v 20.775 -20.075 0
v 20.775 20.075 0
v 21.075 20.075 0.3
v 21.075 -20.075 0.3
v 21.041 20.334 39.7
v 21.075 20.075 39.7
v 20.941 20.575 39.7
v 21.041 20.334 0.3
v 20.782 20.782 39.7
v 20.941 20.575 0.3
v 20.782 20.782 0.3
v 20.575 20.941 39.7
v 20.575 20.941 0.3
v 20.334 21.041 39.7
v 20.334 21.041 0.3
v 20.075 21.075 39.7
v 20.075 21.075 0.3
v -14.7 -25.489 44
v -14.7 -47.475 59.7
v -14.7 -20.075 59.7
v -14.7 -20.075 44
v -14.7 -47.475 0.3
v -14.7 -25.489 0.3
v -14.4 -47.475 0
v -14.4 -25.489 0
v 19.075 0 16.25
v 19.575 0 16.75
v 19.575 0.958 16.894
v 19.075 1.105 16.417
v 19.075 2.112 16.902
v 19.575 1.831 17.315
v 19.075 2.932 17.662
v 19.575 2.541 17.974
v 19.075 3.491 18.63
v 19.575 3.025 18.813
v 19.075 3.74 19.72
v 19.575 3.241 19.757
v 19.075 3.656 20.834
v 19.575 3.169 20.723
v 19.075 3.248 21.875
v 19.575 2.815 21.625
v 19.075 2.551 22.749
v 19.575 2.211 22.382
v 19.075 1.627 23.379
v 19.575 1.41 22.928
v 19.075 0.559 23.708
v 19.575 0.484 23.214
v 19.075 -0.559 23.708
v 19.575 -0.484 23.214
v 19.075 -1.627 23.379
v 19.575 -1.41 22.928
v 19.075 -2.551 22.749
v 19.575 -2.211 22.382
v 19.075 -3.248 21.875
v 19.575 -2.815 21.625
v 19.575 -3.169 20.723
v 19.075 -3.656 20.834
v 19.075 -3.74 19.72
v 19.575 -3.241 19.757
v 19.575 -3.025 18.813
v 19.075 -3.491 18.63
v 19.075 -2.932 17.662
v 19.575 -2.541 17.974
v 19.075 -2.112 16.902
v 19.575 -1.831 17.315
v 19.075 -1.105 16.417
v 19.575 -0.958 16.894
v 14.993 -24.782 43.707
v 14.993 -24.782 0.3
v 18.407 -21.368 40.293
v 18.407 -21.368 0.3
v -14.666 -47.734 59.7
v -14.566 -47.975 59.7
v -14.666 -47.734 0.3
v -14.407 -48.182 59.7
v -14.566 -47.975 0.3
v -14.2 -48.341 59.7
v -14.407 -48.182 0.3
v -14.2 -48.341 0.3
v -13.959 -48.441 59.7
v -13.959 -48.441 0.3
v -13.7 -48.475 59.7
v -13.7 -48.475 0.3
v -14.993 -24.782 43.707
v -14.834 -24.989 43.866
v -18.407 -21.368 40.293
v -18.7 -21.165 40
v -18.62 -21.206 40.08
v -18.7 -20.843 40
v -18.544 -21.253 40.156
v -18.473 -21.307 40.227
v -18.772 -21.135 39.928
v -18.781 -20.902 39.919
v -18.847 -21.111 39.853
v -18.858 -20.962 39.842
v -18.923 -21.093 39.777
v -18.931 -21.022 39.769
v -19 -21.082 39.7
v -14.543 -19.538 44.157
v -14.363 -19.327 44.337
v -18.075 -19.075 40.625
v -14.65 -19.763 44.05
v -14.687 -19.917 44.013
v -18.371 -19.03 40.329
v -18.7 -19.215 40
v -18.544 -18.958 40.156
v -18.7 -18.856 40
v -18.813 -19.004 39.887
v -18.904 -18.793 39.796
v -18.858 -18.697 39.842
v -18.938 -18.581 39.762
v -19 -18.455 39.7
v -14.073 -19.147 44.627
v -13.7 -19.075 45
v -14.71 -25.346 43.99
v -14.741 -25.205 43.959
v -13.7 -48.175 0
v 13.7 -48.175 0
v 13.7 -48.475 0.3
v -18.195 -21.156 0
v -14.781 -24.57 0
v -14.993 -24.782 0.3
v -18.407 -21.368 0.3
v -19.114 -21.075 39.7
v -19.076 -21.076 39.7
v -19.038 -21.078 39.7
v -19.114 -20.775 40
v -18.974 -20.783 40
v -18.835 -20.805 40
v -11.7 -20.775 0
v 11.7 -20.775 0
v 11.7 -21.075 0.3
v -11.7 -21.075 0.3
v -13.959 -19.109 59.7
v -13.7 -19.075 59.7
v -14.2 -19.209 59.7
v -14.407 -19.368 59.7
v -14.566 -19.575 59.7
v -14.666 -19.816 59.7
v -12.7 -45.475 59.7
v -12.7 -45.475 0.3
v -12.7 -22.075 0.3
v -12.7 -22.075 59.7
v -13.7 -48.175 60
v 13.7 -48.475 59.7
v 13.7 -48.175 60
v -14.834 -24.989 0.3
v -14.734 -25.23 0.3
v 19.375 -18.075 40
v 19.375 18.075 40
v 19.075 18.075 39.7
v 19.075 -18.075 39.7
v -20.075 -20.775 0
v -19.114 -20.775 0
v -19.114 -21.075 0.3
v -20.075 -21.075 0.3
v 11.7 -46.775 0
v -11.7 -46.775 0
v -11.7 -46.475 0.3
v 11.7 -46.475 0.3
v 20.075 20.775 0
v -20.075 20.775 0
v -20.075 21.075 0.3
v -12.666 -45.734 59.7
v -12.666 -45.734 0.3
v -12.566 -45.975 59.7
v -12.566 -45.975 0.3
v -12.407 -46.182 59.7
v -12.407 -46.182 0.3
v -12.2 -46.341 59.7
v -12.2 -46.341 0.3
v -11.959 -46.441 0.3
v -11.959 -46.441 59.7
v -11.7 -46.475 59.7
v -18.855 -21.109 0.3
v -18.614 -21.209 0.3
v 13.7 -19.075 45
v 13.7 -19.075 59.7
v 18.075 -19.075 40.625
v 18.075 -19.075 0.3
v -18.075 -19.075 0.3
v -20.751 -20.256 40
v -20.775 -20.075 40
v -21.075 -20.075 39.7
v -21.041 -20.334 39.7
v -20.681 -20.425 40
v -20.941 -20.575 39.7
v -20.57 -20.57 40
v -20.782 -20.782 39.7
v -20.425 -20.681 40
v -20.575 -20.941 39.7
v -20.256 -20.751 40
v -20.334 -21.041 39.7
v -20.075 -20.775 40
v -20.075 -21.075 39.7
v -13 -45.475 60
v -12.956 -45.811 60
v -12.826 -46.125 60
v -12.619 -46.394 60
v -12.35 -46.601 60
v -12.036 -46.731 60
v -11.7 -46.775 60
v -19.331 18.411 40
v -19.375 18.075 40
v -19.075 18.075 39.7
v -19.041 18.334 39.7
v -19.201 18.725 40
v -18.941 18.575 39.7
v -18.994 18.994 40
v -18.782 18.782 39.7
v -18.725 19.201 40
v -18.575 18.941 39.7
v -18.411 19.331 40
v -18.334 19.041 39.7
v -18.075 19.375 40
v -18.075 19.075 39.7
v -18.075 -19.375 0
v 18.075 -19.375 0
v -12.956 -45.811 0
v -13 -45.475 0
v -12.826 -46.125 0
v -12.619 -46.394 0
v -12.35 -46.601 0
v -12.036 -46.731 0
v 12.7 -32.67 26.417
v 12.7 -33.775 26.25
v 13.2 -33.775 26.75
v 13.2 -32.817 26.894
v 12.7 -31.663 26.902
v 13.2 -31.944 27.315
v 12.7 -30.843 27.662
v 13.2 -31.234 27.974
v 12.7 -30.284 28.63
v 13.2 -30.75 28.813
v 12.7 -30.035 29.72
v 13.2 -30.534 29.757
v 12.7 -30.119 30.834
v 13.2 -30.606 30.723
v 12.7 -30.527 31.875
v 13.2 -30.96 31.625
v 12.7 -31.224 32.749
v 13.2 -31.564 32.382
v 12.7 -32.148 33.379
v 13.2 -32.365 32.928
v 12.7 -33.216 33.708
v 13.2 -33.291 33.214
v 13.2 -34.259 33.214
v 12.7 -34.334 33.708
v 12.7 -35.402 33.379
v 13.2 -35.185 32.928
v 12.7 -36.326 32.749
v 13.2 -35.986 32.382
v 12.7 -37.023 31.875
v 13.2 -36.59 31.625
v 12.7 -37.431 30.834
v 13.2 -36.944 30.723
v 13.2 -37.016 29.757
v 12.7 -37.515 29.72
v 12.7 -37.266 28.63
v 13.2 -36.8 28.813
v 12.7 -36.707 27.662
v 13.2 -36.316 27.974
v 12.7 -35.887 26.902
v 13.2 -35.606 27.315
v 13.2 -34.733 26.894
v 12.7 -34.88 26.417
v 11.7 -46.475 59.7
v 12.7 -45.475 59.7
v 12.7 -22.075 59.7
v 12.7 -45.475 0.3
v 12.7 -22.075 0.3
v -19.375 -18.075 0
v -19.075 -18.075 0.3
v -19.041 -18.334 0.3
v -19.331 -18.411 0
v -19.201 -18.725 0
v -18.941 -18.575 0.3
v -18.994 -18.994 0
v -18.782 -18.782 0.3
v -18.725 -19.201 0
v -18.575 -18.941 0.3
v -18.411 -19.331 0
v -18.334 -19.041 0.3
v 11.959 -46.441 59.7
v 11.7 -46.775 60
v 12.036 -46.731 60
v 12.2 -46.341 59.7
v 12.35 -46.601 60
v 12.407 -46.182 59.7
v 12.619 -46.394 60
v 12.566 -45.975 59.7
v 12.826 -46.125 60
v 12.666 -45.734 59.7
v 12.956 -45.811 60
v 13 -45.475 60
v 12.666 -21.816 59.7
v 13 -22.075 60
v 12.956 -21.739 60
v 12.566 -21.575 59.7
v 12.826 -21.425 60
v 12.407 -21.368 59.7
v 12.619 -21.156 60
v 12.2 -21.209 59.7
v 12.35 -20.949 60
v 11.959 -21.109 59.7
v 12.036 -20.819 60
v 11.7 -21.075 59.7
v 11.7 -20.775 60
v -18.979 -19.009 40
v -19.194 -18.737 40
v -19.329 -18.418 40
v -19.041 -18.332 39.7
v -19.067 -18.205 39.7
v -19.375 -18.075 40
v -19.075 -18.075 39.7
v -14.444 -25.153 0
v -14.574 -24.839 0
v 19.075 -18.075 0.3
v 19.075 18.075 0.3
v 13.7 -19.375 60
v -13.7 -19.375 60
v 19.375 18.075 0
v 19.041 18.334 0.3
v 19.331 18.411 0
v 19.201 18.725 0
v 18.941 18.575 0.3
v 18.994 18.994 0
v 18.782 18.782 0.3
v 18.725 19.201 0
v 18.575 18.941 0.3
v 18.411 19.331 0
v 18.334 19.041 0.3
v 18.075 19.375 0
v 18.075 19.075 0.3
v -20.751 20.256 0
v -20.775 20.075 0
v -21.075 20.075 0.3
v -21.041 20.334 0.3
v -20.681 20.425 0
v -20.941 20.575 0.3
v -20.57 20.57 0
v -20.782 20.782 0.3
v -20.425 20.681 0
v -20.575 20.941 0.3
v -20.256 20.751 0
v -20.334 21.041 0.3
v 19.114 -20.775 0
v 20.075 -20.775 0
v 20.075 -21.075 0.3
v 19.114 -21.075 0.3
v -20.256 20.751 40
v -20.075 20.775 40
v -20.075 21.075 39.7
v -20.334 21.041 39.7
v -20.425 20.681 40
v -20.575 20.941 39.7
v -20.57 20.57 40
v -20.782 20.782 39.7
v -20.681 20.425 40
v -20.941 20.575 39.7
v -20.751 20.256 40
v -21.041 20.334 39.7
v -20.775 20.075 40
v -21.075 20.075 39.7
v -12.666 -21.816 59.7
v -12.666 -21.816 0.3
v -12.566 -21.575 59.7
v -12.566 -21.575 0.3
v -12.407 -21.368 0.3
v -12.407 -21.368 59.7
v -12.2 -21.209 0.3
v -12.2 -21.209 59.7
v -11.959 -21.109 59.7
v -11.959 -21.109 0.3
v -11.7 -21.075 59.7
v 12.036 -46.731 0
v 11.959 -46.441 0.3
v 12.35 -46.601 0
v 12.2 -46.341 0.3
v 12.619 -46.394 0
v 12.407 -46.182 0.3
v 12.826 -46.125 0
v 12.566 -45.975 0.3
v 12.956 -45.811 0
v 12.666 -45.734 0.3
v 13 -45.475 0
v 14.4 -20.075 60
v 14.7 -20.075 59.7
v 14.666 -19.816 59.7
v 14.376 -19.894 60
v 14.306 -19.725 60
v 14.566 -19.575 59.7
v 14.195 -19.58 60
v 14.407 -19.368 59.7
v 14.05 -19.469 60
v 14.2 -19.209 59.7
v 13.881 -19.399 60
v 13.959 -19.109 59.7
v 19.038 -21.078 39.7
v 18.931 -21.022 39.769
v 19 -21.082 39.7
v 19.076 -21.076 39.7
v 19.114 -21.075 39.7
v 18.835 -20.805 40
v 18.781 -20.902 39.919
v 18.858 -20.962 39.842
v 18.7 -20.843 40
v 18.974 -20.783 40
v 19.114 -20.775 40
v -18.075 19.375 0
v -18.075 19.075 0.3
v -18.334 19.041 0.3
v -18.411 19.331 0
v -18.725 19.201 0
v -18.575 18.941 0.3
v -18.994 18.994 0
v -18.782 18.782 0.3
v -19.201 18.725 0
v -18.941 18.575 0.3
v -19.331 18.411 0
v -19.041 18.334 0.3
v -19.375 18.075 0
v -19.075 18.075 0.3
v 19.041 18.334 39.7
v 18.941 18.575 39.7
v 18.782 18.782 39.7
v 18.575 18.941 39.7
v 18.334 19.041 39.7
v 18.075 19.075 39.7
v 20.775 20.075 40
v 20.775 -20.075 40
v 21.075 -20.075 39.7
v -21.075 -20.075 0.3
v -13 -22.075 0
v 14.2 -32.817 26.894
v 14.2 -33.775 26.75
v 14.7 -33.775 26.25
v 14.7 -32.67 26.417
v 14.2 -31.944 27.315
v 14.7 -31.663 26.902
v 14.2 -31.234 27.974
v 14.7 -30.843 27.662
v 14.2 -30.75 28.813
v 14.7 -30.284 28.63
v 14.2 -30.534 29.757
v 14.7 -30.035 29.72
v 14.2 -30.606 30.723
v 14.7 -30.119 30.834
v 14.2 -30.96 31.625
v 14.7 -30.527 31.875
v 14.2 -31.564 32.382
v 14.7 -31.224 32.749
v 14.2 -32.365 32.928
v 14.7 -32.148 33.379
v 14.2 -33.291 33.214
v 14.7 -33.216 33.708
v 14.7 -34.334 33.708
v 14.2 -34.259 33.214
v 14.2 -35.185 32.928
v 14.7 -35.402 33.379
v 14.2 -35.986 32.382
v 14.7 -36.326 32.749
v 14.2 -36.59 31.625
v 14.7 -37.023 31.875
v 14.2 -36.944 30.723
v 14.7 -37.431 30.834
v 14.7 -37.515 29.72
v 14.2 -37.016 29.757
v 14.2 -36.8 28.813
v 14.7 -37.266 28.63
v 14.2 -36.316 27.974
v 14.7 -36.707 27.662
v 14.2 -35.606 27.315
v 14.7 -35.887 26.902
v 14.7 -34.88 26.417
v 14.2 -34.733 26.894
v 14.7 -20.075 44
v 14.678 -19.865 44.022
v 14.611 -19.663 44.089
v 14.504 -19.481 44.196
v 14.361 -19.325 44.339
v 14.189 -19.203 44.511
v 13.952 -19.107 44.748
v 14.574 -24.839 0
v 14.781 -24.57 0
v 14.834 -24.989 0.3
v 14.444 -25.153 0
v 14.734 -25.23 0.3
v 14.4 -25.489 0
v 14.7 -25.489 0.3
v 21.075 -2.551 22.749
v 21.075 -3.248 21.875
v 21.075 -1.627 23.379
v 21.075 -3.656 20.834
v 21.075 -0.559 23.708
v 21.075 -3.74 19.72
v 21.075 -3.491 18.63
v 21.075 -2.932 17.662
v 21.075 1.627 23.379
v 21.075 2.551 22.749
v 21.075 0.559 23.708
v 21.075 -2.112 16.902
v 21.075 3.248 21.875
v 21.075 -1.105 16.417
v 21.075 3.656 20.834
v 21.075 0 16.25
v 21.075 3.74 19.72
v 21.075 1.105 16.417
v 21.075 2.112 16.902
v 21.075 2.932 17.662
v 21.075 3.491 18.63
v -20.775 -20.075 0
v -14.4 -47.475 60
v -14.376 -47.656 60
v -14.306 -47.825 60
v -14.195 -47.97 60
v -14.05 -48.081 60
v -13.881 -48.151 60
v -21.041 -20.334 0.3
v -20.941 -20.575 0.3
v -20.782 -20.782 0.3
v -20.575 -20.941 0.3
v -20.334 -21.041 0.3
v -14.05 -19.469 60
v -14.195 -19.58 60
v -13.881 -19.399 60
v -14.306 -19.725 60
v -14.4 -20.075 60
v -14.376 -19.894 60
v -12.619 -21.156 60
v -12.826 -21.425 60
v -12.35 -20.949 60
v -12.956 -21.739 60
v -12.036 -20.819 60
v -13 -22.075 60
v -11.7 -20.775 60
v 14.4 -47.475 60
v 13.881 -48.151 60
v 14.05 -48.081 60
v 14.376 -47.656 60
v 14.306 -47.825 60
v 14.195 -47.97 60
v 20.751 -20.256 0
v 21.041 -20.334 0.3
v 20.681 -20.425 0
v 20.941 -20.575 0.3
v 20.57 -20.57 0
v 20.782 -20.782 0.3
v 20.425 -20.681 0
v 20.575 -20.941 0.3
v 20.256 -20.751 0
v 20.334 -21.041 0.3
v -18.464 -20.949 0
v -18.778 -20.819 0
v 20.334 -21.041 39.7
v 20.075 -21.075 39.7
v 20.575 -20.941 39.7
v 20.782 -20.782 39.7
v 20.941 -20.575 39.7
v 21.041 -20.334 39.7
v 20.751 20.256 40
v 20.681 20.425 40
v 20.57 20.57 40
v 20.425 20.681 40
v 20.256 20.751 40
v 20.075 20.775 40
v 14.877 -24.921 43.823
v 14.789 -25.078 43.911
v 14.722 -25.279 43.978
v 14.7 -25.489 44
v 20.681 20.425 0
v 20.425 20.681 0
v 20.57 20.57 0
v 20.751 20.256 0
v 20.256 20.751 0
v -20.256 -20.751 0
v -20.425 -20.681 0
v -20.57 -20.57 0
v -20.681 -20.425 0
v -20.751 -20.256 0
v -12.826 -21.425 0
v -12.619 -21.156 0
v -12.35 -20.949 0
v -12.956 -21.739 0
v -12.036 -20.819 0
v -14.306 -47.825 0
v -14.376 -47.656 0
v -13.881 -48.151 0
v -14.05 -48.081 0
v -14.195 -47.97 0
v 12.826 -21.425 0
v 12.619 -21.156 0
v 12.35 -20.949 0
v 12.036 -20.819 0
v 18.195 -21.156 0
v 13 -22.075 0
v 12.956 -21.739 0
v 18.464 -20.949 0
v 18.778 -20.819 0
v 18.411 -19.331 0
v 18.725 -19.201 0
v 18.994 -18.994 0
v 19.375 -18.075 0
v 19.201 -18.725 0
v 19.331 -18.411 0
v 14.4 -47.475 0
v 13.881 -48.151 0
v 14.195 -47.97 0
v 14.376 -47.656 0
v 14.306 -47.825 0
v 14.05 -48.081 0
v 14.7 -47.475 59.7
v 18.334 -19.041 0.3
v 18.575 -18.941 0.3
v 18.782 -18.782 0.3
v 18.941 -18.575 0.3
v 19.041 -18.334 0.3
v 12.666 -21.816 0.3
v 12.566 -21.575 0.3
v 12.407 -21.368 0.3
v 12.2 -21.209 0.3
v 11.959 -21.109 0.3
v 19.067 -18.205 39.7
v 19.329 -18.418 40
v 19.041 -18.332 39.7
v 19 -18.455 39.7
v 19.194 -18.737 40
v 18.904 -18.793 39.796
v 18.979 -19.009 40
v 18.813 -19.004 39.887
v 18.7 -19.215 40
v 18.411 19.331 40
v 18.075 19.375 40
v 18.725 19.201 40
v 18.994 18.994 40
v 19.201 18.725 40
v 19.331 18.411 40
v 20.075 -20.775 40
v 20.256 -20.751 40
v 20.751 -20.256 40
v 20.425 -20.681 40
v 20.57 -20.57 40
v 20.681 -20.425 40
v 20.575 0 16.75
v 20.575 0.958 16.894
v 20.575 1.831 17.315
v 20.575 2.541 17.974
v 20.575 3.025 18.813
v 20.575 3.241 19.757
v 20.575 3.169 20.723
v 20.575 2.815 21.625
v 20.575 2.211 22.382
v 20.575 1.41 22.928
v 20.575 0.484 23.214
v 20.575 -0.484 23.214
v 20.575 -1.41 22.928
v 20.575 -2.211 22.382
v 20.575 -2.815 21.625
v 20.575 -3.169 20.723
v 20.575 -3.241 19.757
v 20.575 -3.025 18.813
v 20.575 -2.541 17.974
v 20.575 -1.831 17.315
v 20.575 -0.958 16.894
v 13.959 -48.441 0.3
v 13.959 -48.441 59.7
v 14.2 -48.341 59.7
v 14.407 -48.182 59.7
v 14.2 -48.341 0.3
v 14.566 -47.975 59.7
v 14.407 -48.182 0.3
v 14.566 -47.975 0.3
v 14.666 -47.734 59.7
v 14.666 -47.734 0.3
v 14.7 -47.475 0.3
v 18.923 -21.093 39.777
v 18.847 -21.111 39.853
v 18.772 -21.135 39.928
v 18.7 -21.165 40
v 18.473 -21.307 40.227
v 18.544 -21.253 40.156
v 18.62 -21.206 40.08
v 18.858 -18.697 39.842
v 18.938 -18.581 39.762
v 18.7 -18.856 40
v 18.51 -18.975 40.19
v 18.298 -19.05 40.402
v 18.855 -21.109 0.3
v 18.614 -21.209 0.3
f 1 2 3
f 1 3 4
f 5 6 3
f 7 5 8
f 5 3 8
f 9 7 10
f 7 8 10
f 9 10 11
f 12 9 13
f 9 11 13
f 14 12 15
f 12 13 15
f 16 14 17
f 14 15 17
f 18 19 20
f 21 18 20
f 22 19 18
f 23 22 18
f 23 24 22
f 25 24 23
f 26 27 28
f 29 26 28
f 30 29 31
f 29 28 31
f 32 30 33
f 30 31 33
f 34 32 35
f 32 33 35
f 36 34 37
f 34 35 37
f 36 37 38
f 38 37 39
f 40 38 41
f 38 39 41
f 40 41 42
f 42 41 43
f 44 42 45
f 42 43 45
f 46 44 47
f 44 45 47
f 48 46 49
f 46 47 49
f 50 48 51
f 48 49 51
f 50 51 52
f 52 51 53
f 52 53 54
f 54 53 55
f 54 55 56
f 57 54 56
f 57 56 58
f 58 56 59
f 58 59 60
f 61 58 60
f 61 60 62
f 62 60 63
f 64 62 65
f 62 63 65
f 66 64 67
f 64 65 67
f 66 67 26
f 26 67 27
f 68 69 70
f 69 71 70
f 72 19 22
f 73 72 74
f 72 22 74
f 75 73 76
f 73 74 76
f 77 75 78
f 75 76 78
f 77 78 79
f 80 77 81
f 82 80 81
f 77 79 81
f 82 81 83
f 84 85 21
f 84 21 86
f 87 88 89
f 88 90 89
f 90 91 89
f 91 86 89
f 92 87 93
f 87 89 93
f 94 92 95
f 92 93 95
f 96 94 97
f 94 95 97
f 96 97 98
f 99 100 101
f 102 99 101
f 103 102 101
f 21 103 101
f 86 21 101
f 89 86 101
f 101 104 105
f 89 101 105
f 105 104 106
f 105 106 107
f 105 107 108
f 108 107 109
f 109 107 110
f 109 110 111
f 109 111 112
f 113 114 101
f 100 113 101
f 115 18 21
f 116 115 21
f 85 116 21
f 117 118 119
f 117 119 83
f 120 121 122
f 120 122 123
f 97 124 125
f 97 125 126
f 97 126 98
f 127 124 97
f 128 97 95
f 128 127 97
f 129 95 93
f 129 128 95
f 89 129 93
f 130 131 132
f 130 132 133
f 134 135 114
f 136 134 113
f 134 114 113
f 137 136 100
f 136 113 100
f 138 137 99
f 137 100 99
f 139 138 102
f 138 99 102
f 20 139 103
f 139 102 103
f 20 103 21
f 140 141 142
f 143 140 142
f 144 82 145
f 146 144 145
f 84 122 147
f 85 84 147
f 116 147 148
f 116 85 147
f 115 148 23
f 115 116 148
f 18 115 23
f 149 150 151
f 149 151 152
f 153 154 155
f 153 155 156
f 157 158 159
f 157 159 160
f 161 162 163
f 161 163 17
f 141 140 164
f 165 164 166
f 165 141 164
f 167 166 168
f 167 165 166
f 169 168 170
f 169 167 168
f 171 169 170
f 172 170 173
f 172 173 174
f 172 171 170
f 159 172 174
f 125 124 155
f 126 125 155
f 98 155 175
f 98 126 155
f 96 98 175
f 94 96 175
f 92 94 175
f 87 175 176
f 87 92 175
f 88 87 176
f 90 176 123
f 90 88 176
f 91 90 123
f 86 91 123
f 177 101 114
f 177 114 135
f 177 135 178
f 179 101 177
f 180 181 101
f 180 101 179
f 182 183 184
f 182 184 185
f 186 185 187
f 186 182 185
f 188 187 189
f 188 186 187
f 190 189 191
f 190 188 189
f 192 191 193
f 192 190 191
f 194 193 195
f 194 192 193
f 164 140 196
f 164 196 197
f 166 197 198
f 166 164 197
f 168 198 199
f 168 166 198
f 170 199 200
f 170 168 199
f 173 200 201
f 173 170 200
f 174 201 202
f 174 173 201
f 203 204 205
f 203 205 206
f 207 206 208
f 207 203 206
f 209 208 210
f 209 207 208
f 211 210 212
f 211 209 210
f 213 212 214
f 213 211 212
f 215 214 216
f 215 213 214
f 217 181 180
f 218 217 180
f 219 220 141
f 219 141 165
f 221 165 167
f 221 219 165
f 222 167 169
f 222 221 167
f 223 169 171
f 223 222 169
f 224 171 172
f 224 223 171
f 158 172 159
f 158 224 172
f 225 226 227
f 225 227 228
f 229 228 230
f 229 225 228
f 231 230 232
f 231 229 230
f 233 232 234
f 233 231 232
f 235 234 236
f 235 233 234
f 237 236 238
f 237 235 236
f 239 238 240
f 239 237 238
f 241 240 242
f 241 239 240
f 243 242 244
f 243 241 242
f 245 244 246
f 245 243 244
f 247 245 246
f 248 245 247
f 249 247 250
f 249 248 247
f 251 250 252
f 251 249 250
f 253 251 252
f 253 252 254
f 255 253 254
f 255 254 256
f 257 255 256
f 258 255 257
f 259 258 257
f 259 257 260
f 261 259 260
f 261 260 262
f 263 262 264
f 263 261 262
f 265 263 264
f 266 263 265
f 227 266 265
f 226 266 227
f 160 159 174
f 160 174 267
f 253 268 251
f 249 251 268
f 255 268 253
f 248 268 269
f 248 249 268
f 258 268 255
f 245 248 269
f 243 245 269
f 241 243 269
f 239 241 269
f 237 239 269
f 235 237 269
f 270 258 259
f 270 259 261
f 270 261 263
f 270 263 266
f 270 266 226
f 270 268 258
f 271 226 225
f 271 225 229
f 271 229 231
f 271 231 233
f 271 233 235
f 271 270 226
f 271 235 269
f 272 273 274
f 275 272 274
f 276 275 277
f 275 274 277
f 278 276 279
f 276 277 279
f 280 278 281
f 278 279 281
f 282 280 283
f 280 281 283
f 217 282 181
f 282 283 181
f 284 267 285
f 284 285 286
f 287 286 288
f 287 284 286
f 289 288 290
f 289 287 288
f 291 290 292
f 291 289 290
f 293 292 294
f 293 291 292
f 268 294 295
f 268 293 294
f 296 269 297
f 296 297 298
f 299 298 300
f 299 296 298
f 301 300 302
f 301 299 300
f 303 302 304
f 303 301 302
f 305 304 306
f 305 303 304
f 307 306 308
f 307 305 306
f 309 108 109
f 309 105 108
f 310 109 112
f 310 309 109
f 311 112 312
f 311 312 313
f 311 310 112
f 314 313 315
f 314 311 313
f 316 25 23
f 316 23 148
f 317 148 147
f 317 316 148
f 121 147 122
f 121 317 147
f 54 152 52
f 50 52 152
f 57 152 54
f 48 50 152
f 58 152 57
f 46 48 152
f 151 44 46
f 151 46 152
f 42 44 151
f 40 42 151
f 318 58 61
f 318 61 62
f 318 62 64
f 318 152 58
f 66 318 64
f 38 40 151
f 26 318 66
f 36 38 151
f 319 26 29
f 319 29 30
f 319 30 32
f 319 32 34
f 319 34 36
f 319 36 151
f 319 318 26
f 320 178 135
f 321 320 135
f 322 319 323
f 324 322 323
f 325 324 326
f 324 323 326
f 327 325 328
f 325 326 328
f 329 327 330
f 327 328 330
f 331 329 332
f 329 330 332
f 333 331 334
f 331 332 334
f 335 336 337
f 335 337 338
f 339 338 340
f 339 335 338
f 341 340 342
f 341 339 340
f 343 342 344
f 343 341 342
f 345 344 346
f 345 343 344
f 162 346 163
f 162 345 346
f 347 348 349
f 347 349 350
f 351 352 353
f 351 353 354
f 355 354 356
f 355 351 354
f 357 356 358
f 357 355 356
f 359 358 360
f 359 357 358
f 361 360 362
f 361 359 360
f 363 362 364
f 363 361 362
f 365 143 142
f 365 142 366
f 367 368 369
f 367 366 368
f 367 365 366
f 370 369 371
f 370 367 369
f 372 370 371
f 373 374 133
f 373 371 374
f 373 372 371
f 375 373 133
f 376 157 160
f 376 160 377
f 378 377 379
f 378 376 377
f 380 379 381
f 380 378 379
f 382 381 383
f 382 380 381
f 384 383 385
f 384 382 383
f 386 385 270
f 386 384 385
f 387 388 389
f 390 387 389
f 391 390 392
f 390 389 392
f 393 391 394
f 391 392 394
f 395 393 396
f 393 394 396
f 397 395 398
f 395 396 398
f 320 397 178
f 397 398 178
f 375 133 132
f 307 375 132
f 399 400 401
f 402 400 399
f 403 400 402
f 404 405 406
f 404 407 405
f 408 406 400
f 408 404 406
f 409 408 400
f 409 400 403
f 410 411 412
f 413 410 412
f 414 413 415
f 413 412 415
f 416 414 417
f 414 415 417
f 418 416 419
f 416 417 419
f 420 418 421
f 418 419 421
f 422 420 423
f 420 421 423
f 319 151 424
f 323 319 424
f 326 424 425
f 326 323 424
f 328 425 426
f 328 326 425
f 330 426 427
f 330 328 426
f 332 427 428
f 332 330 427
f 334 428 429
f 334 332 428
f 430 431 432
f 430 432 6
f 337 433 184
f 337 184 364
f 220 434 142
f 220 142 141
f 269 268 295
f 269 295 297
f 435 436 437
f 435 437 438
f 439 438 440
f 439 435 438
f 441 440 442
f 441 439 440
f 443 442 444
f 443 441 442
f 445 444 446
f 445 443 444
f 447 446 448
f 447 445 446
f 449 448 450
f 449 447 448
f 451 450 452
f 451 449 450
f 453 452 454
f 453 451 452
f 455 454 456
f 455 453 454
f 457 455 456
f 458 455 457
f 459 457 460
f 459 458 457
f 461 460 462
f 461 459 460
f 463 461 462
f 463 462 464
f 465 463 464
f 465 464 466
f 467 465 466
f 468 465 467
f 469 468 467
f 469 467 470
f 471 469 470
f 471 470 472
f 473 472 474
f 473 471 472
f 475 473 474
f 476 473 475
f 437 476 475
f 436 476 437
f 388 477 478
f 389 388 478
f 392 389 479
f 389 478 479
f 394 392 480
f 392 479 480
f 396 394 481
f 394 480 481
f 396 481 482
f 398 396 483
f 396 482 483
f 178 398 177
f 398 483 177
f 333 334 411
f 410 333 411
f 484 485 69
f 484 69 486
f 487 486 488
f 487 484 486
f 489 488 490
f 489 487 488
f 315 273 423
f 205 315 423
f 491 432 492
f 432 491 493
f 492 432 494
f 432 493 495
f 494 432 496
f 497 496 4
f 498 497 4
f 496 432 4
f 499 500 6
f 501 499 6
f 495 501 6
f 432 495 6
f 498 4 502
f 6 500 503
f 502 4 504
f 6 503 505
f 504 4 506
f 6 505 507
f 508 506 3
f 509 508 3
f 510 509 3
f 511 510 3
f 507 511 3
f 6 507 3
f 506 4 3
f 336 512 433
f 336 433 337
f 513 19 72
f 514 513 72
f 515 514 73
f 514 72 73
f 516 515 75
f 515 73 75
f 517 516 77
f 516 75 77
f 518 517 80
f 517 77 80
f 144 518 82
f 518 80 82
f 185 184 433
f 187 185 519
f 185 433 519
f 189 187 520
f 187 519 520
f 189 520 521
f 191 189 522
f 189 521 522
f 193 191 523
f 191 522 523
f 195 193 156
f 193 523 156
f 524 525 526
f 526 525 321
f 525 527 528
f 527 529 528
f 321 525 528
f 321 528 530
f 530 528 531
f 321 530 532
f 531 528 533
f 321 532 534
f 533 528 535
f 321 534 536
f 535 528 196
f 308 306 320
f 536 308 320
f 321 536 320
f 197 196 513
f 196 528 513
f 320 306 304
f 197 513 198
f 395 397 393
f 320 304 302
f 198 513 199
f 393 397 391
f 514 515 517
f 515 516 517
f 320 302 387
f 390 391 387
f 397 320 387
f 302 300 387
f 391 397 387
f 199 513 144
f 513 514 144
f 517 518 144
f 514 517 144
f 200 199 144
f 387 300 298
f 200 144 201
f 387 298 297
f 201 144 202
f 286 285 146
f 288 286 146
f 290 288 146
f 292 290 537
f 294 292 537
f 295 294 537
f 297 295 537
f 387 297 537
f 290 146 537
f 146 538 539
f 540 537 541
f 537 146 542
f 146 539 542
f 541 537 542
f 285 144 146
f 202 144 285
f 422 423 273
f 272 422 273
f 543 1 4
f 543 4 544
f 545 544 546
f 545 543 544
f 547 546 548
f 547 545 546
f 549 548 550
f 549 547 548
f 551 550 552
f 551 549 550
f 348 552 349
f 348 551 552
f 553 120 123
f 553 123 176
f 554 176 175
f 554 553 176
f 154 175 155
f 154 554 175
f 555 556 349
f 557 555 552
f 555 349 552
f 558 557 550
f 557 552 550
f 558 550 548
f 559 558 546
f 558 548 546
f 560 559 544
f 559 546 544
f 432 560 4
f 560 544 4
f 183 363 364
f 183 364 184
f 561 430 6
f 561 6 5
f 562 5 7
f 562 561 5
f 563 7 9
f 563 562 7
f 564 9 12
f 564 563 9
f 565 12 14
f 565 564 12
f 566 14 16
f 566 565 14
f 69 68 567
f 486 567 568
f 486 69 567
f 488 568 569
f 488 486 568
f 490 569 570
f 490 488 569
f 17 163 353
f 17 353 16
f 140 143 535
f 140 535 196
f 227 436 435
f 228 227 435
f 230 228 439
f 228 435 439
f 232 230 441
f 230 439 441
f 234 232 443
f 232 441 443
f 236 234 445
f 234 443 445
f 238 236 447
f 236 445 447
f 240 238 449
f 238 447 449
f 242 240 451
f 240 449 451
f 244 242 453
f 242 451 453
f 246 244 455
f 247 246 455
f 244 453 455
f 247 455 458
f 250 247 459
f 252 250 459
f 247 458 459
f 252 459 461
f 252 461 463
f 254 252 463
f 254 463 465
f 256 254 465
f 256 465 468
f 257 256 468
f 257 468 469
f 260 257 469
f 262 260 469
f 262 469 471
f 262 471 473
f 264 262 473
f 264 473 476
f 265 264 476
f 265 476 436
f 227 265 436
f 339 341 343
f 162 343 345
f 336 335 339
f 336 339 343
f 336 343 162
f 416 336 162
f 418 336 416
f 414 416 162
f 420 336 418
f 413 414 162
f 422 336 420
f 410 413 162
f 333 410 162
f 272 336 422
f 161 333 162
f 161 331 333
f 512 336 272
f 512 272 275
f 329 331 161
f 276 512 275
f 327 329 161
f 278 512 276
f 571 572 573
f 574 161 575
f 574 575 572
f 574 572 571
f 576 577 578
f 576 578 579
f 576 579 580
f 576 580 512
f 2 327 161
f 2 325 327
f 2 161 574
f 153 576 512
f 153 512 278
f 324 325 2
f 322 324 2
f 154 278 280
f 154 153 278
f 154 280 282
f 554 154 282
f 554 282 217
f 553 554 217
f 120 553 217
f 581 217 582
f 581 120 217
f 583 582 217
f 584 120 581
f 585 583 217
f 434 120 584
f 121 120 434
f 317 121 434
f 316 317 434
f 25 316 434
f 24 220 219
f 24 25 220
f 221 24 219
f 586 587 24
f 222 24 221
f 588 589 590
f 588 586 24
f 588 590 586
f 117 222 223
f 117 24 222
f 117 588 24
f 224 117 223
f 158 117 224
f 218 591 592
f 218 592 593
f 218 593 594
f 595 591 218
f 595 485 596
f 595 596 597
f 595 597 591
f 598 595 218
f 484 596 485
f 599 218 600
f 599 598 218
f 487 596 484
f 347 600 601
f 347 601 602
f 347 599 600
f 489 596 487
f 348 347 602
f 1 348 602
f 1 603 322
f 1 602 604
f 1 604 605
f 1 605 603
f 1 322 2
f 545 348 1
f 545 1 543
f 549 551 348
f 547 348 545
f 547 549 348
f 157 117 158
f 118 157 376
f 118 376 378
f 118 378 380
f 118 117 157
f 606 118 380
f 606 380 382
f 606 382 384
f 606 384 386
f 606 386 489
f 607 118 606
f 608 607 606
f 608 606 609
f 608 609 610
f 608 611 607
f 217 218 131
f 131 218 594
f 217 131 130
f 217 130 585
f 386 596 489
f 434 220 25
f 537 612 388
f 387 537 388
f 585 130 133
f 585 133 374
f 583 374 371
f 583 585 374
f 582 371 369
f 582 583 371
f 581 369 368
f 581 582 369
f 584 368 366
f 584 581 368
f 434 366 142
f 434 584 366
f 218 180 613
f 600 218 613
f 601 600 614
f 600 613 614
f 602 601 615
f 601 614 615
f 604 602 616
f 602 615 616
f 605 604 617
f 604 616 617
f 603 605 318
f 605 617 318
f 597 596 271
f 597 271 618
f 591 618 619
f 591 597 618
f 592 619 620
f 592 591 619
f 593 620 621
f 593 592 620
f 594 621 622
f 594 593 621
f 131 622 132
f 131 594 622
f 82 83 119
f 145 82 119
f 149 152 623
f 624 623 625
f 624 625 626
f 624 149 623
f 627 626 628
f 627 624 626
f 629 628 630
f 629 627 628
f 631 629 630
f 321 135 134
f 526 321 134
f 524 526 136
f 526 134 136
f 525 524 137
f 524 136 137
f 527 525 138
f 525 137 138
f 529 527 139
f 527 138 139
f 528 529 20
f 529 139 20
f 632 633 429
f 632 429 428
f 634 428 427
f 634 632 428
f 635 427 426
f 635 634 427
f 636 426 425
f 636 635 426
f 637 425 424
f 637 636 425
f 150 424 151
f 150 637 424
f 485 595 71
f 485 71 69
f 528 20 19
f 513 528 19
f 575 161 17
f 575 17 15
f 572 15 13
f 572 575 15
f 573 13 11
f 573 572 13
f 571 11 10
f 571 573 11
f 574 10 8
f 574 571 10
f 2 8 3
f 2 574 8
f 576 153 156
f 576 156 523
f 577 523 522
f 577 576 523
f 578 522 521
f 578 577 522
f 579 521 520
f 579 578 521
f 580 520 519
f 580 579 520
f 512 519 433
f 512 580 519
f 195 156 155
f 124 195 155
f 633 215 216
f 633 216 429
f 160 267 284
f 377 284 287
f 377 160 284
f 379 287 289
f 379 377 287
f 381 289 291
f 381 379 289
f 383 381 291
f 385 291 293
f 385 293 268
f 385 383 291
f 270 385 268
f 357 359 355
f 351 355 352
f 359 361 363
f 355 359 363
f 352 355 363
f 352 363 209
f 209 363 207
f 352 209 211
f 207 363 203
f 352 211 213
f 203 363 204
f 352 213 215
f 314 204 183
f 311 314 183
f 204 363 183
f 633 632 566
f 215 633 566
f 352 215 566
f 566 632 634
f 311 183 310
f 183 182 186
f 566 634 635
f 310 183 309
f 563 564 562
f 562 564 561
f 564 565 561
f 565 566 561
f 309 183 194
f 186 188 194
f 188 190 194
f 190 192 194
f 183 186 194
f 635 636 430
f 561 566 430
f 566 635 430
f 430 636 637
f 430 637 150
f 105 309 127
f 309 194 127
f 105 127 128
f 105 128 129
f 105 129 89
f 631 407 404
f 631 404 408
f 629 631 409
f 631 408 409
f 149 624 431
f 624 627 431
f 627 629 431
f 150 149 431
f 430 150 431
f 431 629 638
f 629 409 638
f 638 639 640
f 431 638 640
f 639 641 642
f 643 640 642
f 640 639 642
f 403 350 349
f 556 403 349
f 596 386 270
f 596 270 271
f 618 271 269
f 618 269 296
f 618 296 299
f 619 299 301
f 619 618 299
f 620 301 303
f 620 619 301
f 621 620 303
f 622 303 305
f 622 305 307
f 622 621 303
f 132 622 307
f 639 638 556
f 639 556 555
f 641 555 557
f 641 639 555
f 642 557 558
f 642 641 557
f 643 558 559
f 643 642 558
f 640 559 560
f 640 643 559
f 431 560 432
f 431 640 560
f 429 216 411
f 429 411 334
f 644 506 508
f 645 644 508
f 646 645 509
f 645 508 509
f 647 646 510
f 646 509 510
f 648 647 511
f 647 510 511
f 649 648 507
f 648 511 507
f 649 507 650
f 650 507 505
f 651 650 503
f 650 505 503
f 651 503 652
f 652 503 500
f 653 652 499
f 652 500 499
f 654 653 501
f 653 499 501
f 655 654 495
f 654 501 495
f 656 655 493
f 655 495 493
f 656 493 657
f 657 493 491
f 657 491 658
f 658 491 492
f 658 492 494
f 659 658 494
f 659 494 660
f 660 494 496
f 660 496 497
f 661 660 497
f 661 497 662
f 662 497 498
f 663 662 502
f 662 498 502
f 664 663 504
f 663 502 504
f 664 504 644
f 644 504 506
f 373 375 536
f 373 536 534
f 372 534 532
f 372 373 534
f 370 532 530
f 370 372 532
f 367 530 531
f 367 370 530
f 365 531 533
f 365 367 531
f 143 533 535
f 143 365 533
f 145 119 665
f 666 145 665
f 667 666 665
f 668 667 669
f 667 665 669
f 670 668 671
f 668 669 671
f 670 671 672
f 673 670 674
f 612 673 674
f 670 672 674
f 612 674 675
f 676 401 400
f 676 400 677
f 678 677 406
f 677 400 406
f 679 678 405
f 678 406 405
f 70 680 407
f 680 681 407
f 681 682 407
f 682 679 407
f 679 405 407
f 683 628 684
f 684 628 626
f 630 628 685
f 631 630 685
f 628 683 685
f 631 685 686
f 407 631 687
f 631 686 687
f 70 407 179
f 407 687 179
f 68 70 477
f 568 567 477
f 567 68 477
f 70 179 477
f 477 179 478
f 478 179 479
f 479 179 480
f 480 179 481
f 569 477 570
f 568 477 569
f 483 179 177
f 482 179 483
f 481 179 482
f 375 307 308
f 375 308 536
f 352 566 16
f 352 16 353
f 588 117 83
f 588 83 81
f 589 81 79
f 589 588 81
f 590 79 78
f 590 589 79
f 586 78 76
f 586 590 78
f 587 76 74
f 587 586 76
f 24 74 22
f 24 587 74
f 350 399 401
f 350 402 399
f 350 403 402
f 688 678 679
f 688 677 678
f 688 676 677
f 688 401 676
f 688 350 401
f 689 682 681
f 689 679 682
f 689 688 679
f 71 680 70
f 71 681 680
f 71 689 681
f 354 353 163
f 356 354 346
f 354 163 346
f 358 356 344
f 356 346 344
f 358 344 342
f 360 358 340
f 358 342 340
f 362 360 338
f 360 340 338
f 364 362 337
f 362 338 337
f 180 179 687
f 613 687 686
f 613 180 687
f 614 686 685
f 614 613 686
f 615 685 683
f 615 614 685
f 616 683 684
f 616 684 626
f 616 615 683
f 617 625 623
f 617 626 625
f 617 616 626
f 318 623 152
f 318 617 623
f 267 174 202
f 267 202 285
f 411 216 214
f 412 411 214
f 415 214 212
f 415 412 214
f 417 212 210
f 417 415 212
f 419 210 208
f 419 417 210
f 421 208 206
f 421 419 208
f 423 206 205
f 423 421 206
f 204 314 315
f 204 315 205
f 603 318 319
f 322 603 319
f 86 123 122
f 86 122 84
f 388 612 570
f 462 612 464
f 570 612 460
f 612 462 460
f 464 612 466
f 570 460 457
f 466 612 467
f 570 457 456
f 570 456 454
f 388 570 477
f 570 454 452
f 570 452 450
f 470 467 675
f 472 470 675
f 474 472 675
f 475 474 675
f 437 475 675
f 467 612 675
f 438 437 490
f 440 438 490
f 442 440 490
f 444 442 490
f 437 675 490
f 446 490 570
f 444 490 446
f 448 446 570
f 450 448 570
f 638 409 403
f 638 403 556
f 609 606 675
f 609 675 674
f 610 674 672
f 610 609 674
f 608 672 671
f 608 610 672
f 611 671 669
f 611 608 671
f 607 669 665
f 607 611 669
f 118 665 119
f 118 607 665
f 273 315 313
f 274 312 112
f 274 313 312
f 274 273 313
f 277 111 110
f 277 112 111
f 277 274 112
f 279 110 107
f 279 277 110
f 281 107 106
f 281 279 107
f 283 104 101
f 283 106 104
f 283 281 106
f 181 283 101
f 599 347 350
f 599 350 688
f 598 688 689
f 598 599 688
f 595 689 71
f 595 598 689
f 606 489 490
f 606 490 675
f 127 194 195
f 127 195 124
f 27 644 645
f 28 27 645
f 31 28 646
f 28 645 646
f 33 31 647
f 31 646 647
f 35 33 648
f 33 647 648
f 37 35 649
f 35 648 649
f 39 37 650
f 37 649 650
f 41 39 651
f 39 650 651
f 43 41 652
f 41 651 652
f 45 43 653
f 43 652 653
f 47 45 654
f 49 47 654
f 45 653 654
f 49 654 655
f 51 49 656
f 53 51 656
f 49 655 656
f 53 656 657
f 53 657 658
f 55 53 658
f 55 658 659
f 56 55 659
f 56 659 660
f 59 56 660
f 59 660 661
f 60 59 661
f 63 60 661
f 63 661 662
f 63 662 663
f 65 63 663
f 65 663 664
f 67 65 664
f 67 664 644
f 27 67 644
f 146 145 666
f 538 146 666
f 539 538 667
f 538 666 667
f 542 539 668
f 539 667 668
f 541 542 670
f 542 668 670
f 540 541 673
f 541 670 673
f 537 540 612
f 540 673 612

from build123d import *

# Parameters (mm, degrees)
SKETCH1_W           = 42.15
SKETCH1_H           = 42.15
SKETCH1_W_2         = 38.15
SKETCH1_H_2         = 38.15
BOSS_EXTRUDE1_DEPTH = 40
BOSS_EXTRUDE2_START = -40
SKETCH3_W           = 29.4
SKETCH3_H           = 29.4
SKETCH3_W_2         = 25.4
SKETCH3_H_2         = 25.4
BOSS_EXTRUDE2_DEPTH = 60
CHAMFER1_SIZE       = 4
FILLET1_R           = 1
CHAMFER2_SIZE       = 0.3
SKETCH6_R           = 3.25
CUT_EXTRUDE1_DEPTH  = 20
CHAMFER3_SIZE       = 0.5


with BuildPart() as part:
    # Sketch1 → Boss-Extrude1 (new body)
    with BuildSketch(Plane.XY):
        Rectangle(SKETCH1_W, SKETCH1_H)
        Rectangle(SKETCH1_W_2, SKETCH1_H_2, mode=Mode.SUBTRACT)
    extrude(amount=BOSS_EXTRUDE1_DEPTH)

    # Sketch3 → Boss-Extrude2 (add)
    with BuildSketch(Plane.XY.offset(40).offset(BOSS_EXTRUDE2_START)):
        with Locations((0, -33.775)):
            Rectangle(SKETCH3_W, SKETCH3_H)
        with Locations((0, -33.775)):
            Rectangle(SKETCH3_W_2, SKETCH3_H_2, mode=Mode.SUBTRACT)
    extrude(amount=BOSS_EXTRUDE2_DEPTH)

    # Chamfer1
    chamfer1_edges = [part.edges().sort_by_distance(p)[0] for p in [
        (-14.7, -21.075, 20),
        (-14.7, -20.075, 40),
        (14.7, -20.075, 40),
        (14.7, -21.075, 20),
    ]]
    chamfer(chamfer1_edges, length=CHAMFER1_SIZE)

    # Fillet1
    # the kernel refuses this fillet: 1 mm, written as the material it adds along each edge
    with BuildSketch(Plane(origin=(-18.7, -21.075, 41.035533906), x_dir=(-1, 0, 0), z_dir=(0, 0, -1))) as fillet1_piece_1_section:
        with BuildLine():
            CenterArc((FILLET1_R * 0.414213562373, -FILLET1_R), FILLET1_R, 90, 45)
            Line((-FILLET1_R * 0.292893218813, -FILLET1_R * 0.292893218813), (0, 0))
            Line((0, 0), (FILLET1_R * 0.414213562373, 0))
        make_face()
    fillet1_piece_1 = extrude(amount=41.035533906, mode=Mode.PRIVATE)
    fillet1_piece_1 = split(fillet1_piece_1, bisect_by=Plane(origin=(-18.52848767, -21.244019164, 40), z_dir=(0, 0, 1)), keep=Keep.TOP, mode=Mode.PRIVATE)
    fillet1_piece_1 = split(fillet1_piece_1, bisect_by=Plane(origin=(-18.571365753, -21.244019164, 40.128634247), z_dir=(0.7071067811865476, 0, -0.7071067811865476)), keep=Keep.TOP, mode=Mode.PRIVATE)
    add(fillet1_piece_1)
    with BuildSketch(Plane(origin=(-18.7, -21.075, 40), x_dir=(-1, 0, 0), z_dir=(0, 0, -1))) as fillet1_piece_2_section:
        with BuildLine():
            CenterArc((FILLET1_R * 0.414213562373, -FILLET1_R), FILLET1_R, 90, 45)
            Line((-FILLET1_R * 0.292893218813, -FILLET1_R * 0.292893218813), (0, 0))
            Line((0, 0), (FILLET1_R * 0.414213562373, 0))
        make_face()
    fillet1_piece_2 = extrude(amount=40, mode=Mode.PRIVATE)
    fillet1_piece_2 = split(fillet1_piece_2, bisect_by=Plane(origin=(-18.871940498, -21.07666124, 39.828059502), z_dir=(-0.7071067811865476, 0, 0.7071067811865476)), keep=Keep.TOP, mode=Mode.PRIVATE)
    add(fillet1_piece_2)
    with BuildSketch(Plane(origin=(-18.7, -21.075, 40), x_dir=(-1, 0, 0), z_dir=(0, 0, -1))) as fillet1_piece_3_section:
        with BuildLine():
            CenterArc((FILLET1_R * 0.414213562373, -FILLET1_R), FILLET1_R, 90, 45)
            Line((-FILLET1_R * 0.292893218813, -FILLET1_R * 0.292893218813), (0, 0))
            Line((0, 0), (FILLET1_R * 0.414213562373, 0))
        make_face()
    fillet1_piece_3 = extrude(amount=40, mode=Mode.PRIVATE)
    fillet1_piece_3 = split(fillet1_piece_3, bisect_by=Plane(origin=(-28.731905548, -21.13692691, 29.968094452), z_dir=(0.7071067811865476, 0, -0.7071067811865476)), keep=Keep.TOP, mode=Mode.PRIVATE)
    add(fillet1_piece_3)
    with BuildSketch(Plane(origin=(-14.7, -25.075, 45.035533906), x_dir=(-0.7071067811865476, 0.7071067811865476, 0), z_dir=(0, 0, -1))) as fillet1_piece_4_section:
        with BuildLine():
            CenterArc((FILLET1_R * 0.414213562373, -FILLET1_R), FILLET1_R, 90, 45)
            Line((-FILLET1_R * 0.292893218813, -FILLET1_R * 0.292893218813), (0, 0))
            Line((0, 0), (FILLET1_R * 0.414213562373, 0))
        make_face()
    fillet1_piece_4 = extrude(amount=45.035533906, mode=Mode.PRIVATE)
    fillet1_piece_4 = split(fillet1_piece_4, bisect_by=Plane(origin=(-25.746262665, -25.100835331, 32.953737335), z_dir=(0.7071067811865476, 0, -0.7071067811865476)), keep=Keep.TOP, mode=Mode.PRIVATE)
    add(fillet1_piece_4)
    with BuildSketch(Plane(origin=(14.7, -25.075, 0), x_dir=(0, -1, 0), z_dir=(0, 0, 1))) as fillet1_piece_5_section:
        with BuildLine():
            CenterArc((FILLET1_R * 0.414213562373, FILLET1_R), FILLET1_R, 225, 45)
            Line((-FILLET1_R * 0.292893218813, FILLET1_R * 0.292893218813), (0, 0))
            Line((0, 0), (FILLET1_R * 0.414213562373, 0))
        make_face()
    fillet1_piece_5 = extrude(amount=45.035533906, mode=Mode.PRIVATE)
    fillet1_piece_5 = split(fillet1_piece_5, bisect_by=Plane(origin=(25.746262665, -25.100835331, 32.953737335), z_dir=(-0.7071067811865476, 0, -0.7071067811865476)), keep=Keep.TOP, mode=Mode.PRIVATE)
    add(fillet1_piece_5)
    with BuildSketch(Plane(origin=(18.7, -21.075, 0), x_dir=(1, 0, 0), z_dir=(0, 0, 1))) as fillet1_piece_6_section:
        with BuildLine():
            CenterArc((FILLET1_R * 0.414213562373, -FILLET1_R), FILLET1_R, 90, 45)
            Line((-FILLET1_R * 0.292893218813, -FILLET1_R * 0.292893218813), (0, 0))
            Line((0, 0), (FILLET1_R * 0.414213562373, 0))
        make_face()
    fillet1_piece_6 = extrude(amount=40, mode=Mode.PRIVATE)
    fillet1_piece_6 = split(fillet1_piece_6, bisect_by=Plane(origin=(28.731905548, -21.13692691, 29.968094452), z_dir=(-0.7071067811865476, 0, -0.7071067811865476)), keep=Keep.TOP, mode=Mode.PRIVATE)
    add(fillet1_piece_6)
    with BuildSketch(Plane(origin=(18.7, -21.075, 0), x_dir=(1, 0, 0), z_dir=(0, 0, 1))) as fillet1_piece_7_section:
        with BuildLine():
            CenterArc((FILLET1_R * 0.414213562373, -FILLET1_R), FILLET1_R, 90, 45)
            Line((-FILLET1_R * 0.292893218813, -FILLET1_R * 0.292893218813), (0, 0))
            Line((0, 0), (FILLET1_R * 0.414213562373, 0))
        make_face()
    fillet1_piece_7 = extrude(amount=41.035533906, mode=Mode.PRIVATE)
    fillet1_piece_7 = split(fillet1_piece_7, bisect_by=Plane(origin=(18.52848767, -21.244019164, 40), z_dir=(0, 0, 1)), keep=Keep.TOP, mode=Mode.PRIVATE)
    fillet1_piece_7 = split(fillet1_piece_7, bisect_by=Plane(origin=(18.571365753, -21.244019164, 40.128634247), z_dir=(-0.7071067811865476, 0, -0.7071067811865476)), keep=Keep.TOP, mode=Mode.PRIVATE)
    add(fillet1_piece_7)
    with BuildSketch(Plane(origin=(18.7, -21.075, 0), x_dir=(1, 0, 0), z_dir=(0, 0, 1))) as fillet1_piece_8_section:
        with BuildLine():
            CenterArc((FILLET1_R * 0.414213562373, -FILLET1_R), FILLET1_R, 90, 45)
            Line((-FILLET1_R * 0.292893218813, -FILLET1_R * 0.292893218813), (0, 0))
            Line((0, 0), (FILLET1_R * 0.414213562373, 0))
        make_face()
    fillet1_piece_8 = extrude(amount=40, mode=Mode.PRIVATE)
    fillet1_piece_8 = split(fillet1_piece_8, bisect_by=Plane(origin=(18.871940498, -21.07666124, 39.828059502), z_dir=(0.7071067811865476, 0, 0.7071067811865476)), keep=Keep.TOP, mode=Mode.PRIVATE)
    add(fillet1_piece_8)
    with BuildSketch(Plane(origin=(12.7, -46.475, 0), x_dir=(-1, 0, 0), z_dir=(0, 0, 1)), Plane(origin=(-12.7, -46.475, 0), x_dir=(0, 1, 0), z_dir=(0, 0, 1))) as fillet1_piece_9:
        with BuildLine():
            CenterArc((FILLET1_R, -FILLET1_R), FILLET1_R, 90, 90)
            Line((0, -FILLET1_R), (0, 0))
            Line((0, 0), (FILLET1_R, 0))
        make_face()
    extrude(amount=60)
    with BuildSketch(Plane(origin=(12.7, -21.075, 0), x_dir=(-1, 0, 0), z_dir=(0, 0, 1)), Plane(origin=(-12.7, -21.075, 60), x_dir=(1, 0, 0), z_dir=(0, 0, -1))) as fillet1_piece_10:
        with BuildLine():
            CenterArc((FILLET1_R, FILLET1_R), FILLET1_R, 180, 90)
            Line((0, FILLET1_R), (0, 0))
            Line((0, 0), (FILLET1_R, 0))
        make_face()
    extrude(amount=60)
    with BuildSketch(Plane(origin=(-19.075, -19.075, 0), x_dir=(1, 0, 0), z_dir=(0, 0, 1))) as fillet1_piece_11_section:
        with BuildLine():
            CenterArc((FILLET1_R, FILLET1_R), FILLET1_R, 180, 90)
            Line((0, FILLET1_R), (0, 0))
            Line((0, 0), (FILLET1_R, 0))
        make_face()
    fillet1_piece_11 = extrude(amount=40, mode=Mode.PRIVATE)
    fillet1_piece_11 = split(fillet1_piece_11, bisect_by=Plane(origin=(-28.821320902, -18.849083106, 29.878679098), z_dir=(0.7071067811865476, 0, -0.7071067811865476)), keep=Keep.TOP, mode=Mode.PRIVATE)
    add(fillet1_piece_11)
    with BuildSketch(Plane(origin=(-19.075, -19.075, 0), x_dir=(1, 0, 0), z_dir=(0, 0, 1))) as fillet1_piece_12_section:
        with BuildLine():
            CenterArc((FILLET1_R, FILLET1_R), FILLET1_R, 180, 90)
            Line((0, FILLET1_R), (0, 0))
            Line((0, 0), (FILLET1_R, 0))
        make_face()
    fillet1_piece_12 = extrude(amount=40, mode=Mode.PRIVATE)
    fillet1_piece_12 = split(fillet1_piece_12, bisect_by=Plane(origin=(-18.920138654, -18.748379017, 39.779861346), z_dir=(-0.7071067811865476, 0, 0.7071067811865476)), keep=Keep.TOP, mode=Mode.PRIVATE)
    add(fillet1_piece_12)
    with BuildSketch(Plane(origin=(-19.075, -19.075, 0), x_dir=(1, 0, 0), z_dir=(0, 0, 1))) as fillet1_piece_13_section:
        with BuildLine():
            CenterArc((FILLET1_R, FILLET1_R), FILLET1_R, 180, 90)
            Line((0, FILLET1_R), (0, 0))
            Line((0, 0), (FILLET1_R, 0))
        make_face()
    fillet1_piece_13 = extrude(amount=42.5, mode=Mode.PRIVATE)
    fillet1_piece_13 = split(fillet1_piece_13, bisect_by=Plane(origin=(-18.390272187, -19.052221158, 40), z_dir=(0, 0, 1)), keep=Keep.TOP, mode=Mode.PRIVATE)
    fillet1_piece_13 = split(fillet1_piece_13, bisect_by=Plane(origin=(-18.467704141, -19.052221158, 40.232295859), z_dir=(0.7071067811865476, 0, -0.7071067811865476)), keep=Keep.TOP, mode=Mode.PRIVATE)
    add(fillet1_piece_13)
    with BuildSketch(Plane(origin=(-19.075, 19.075, 0), x_dir=(0, -1, 0), z_dir=(0, 0, 1)), Plane(origin=(19.075, 19.075, 0), x_dir=(-1, 0, 0), z_dir=(0, 0, 1))) as fillet1_piece_14:
        with BuildLine():
            CenterArc((FILLET1_R, FILLET1_R), FILLET1_R, 180, 90)
            Line((0, FILLET1_R), (0, 0))
            Line((0, 0), (FILLET1_R, 0))
        make_face()
    extrude(amount=40)
    with BuildSketch(Plane(origin=(19.075, -19.075, 0), x_dir=(-1, 0, 0), z_dir=(0, 0, 1))) as fillet1_piece_15_section:
        with BuildLine():
            CenterArc((FILLET1_R, -FILLET1_R), FILLET1_R, 90, 90)
            Line((0, -FILLET1_R), (0, 0))
            Line((0, 0), (FILLET1_R, 0))
        make_face()
    fillet1_piece_15 = extrude(amount=40, mode=Mode.PRIVATE)
    fillet1_piece_15 = split(fillet1_piece_15, bisect_by=Plane(origin=(28.821320902, -18.849083106, 29.878679098), z_dir=(-0.7071067811865476, 0, -0.7071067811865476)), keep=Keep.TOP, mode=Mode.PRIVATE)
    add(fillet1_piece_15)
    with BuildSketch(Plane(origin=(19.075, -19.075, 0), x_dir=(-1, 0, 0), z_dir=(0, 0, 1))) as fillet1_piece_16_section:
        with BuildLine():
            CenterArc((FILLET1_R, -FILLET1_R), FILLET1_R, 90, 90)
            Line((0, -FILLET1_R), (0, 0))
            Line((0, 0), (FILLET1_R, 0))
        make_face()
    fillet1_piece_16 = extrude(amount=40, mode=Mode.PRIVATE)
    fillet1_piece_16 = split(fillet1_piece_16, bisect_by=Plane(origin=(18.920138654, -18.748379017, 39.779861346), z_dir=(0.7071067811865476, 0, 0.7071067811865476)), keep=Keep.TOP, mode=Mode.PRIVATE)
    add(fillet1_piece_16)
    with BuildSketch(Plane(origin=(19.075, -19.075, 0), x_dir=(-1, 0, 0), z_dir=(0, 0, 1))) as fillet1_piece_17_section:
        with BuildLine():
            CenterArc((FILLET1_R, -FILLET1_R), FILLET1_R, 90, 90)
            Line((0, -FILLET1_R), (0, 0))
            Line((0, 0), (FILLET1_R, 0))
        make_face()
    fillet1_piece_17 = extrude(amount=42.5, mode=Mode.PRIVATE)
    fillet1_piece_17 = split(fillet1_piece_17, bisect_by=Plane(origin=(18.390272187, -19.052221158, 40), z_dir=(0, 0, 1)), keep=Keep.TOP, mode=Mode.PRIVATE)
    fillet1_piece_17 = split(fillet1_piece_17, bisect_by=Plane(origin=(18.467704141, -19.052221158, 40.232295859), z_dir=(-0.7071067811865476, 0, -0.7071067811865476)), keep=Keep.TOP, mode=Mode.PRIVATE)
    add(fillet1_piece_17)
    # the kernel refuses this fillet: 1 mm, written as the material it takes off along each edge
    with BuildSketch(Plane(origin=(14.7, -48.475, -2.5), x_dir=(0, 1, 0), z_dir=(0, 0, 1))) as fillet1_2_piece_1:
        with BuildLine():
            CenterArc((FILLET1_R, FILLET1_R), FILLET1_R, 180, 90)
            Line((0, FILLET1_R), (0, 0))
            Line((0, 0), (FILLET1_R, 0))
        make_face()
    extrude(amount=65, mode=Mode.SUBTRACT)
    with BuildSketch(Plane(origin=(-14.7, -48.475, -2.5), x_dir=(0, 1, 0), z_dir=(0, 0, 1))) as fillet1_2_piece_2:
        with BuildLine():
            CenterArc((FILLET1_R, -FILLET1_R), FILLET1_R, 90, 90)
            Line((0, -FILLET1_R), (0, 0))
            Line((0, 0), (FILLET1_R, 0))
        make_face()
    extrude(amount=65, mode=Mode.SUBTRACT)
    with BuildSketch(Plane(origin=(-21.075, -21.075, -2.5), x_dir=(0, 1, 0), z_dir=(0, 0, 1)), Plane(origin=(21.075, -21.075, -2.5), x_dir=(-1, 0, 0), z_dir=(0, 0, 1)), Plane(origin=(21.075, 21.075, -2.5), x_dir=(0, -1, 0), z_dir=(0, 0, 1)), Plane(origin=(-21.075, 21.075, -2.5), x_dir=(1, 0, 0), z_dir=(0, 0, 1))) as fillet1_2_piece_3:
        with BuildLine():
            CenterArc((FILLET1_R, -FILLET1_R), FILLET1_R, 90, 90)
            Line((0, -FILLET1_R), (0, 0))
            Line((0, 0), (FILLET1_R, 0))
        make_face()
    extrude(amount=45, mode=Mode.SUBTRACT)
    with BuildSketch(Plane(origin=(14.7, -19.075, 41.5), x_dir=(-1, 0, 0), z_dir=(0, 0, 1))) as fillet1_2_piece_4_section:
        with BuildLine():
            CenterArc((FILLET1_R, FILLET1_R), FILLET1_R, 180, 90)
            Line((0, FILLET1_R), (0, 0))
            Line((0, 0), (FILLET1_R, 0))
        make_face()
    fillet1_2_piece_4 = extrude(amount=21, mode=Mode.PRIVATE)
    fillet1_2_piece_4 = split(fillet1_2_piece_4, bisect_by=Plane(origin=(9.907111196, -19.302897648, 48.792888804), z_dir=(0.7071067811865476, 0, 0.7071067811865476)), keep=Keep.TOP, mode=Mode.PRIVATE)
    add(fillet1_2_piece_4, mode=Mode.SUBTRACT)
    with BuildSketch(Plane(origin=(-14.7, -19.075, 41.5), x_dir=(0, -1, 0), z_dir=(0, 0, 1))) as fillet1_2_piece_5_section:
        with BuildLine():
            CenterArc((FILLET1_R, FILLET1_R), FILLET1_R, 180, 90)
            Line((0, FILLET1_R), (0, 0))
            Line((0, 0), (FILLET1_R, 0))
        make_face()
    fillet1_2_piece_5 = extrude(amount=21, mode=Mode.PRIVATE)
    fillet1_2_piece_5 = split(fillet1_2_piece_5, bisect_by=Plane(origin=(-9.907111196, -19.302897648, 48.792888804), z_dir=(-0.7071067811865476, 0, 0.7071067811865476)), keep=Keep.TOP, mode=Mode.PRIVATE)
    add(fillet1_2_piece_5, mode=Mode.SUBTRACT)

    # Chamfer2
    chamfer2_edges = [part.edges().sort_by_distance(p)[0] for p in [
        (-19.594606781, -21.075, 40),
        (-16.7, -23.075, 0),
        (16.7, -23.075, 0),
        (19.594606781, -21.075, 40),
        (19.594606781, -21.075, 0),
        (0, -48.475, 0),
        (19.075, 0, 0),
        (0, 19.075, 0),
        (-19.075, 0, 0),
        (-21.075, 0, 0),
        (0, 21.075, 0),
        (21.075, 0, 0),
        (12.7, -33.775, 0),
        (0, -21.075, 0),
        (-12.7, -33.775, 0),
        (0, -46.475, 0),
        (-20.782106781, 20.782106781, 0),
        (20.782106781, 20.782106781, 0),
        (20.782106781, -20.782106781, 0),
        (-20.782106781, -20.782106781, 0),
        (-14.407106781, -48.182106781, 0),
        (14.407106781, -48.182106781, 0),
        (-21.075, 0, 40),
        (21.075, 0, 40),
        (0, 21.075, 40),
        (-19.075, 0, 40),
        (0, 19.075, 40),
        (19.075, 0, 40),
        (-20.782106781, 20.782106781, 40),
        (20.782106781, 20.782106781, 40),
        (20.782106781, -20.782106781, 40),
        (-20.782106781, -20.782106781, 40),
        (-18.902293437, -21.09771301, 40),
        (-18.73153013, -21.151120467, 0),
        (-14.776120467, -25.10653013, 0),
        (14.776120467, -25.10653013, 0),
        (18.73153013, -21.151120467, 0),
        (18.902293437, -21.09771301, 40),
        (12.407106781, -46.182106781, 60),
        (12.407106781, -46.182106781, 0),
        (12.407106781, -21.367893219, 60),
        (12.407106781, -21.367893219, 0),
        (-12.407106781, -21.367893219, 60),
        (-12.407106781, -21.367893219, 0),
        (-12.407106781, -46.182106781, 60),
        (-12.407106781, -46.182106781, 0),
        (-18.782106781, -18.782106781, 0),
        (-18.976387819, -18.508012702, 40),
        (-18.782106781, 18.782106781, 0),
        (-18.782106781, 18.782106781, 40),
        (18.782106781, 18.782106781, 0),
        (18.782106781, 18.782106781, 40),
        (18.782106781, -18.782106781, 0),
        (18.976387819, -18.508012702, 40),
        (14.7, -36.482106781, 0),
        (14.7, -33.775, 60),
        (0, -48.475, 60),
        (0, -19.075, 60),
        (-14.7, -33.775, 60),
        (-12.7, -33.775, 60),
        (0, -21.075, 60),
        (12.7, -33.775, 60),
        (0, -46.475, 60),
        (-14.407106781, -48.182106781, 60),
        (14.407106781, -48.182106781, 60),
        (-14.407106781, -19.367893219, 60),
        (14.407106781, -19.367893219, 60),
        (0, -19.075, 0),
        (-14.7, -36.482106781, 0),
        (-19.594606781, -21.075, 0),
    ]]
    chamfer(chamfer2_edges, length=CHAMFER2_SIZE)

    # Sketch6 → Cut-Extrude1 (cut)
    with BuildSketch(Plane(origin=(21.075, 0, 0), x_dir=(0, 0, -1), z_dir=(1, 0, 0))):
        with Locations((-20, 0)):
            Circle(SKETCH6_R)
        with Locations((-30, -33.775)):
            Circle(SKETCH6_R)
    extrude(amount=-CUT_EXTRUDE1_DEPTH, mode=Mode.SUBTRACT)

    # Chamfer3
    chamfer3_edges = [part.edges().sort_by_distance(p)[0] for p in [
        (19.075, 0, 23.25),
        (21.075, 0, 23.25),
        (14.7, -33.775, 33.25),
        (12.7, -33.775, 33.25),
    ]]
    chamfer(chamfer3_edges, length=CHAMFER3_SIZE)


solid = part.part
